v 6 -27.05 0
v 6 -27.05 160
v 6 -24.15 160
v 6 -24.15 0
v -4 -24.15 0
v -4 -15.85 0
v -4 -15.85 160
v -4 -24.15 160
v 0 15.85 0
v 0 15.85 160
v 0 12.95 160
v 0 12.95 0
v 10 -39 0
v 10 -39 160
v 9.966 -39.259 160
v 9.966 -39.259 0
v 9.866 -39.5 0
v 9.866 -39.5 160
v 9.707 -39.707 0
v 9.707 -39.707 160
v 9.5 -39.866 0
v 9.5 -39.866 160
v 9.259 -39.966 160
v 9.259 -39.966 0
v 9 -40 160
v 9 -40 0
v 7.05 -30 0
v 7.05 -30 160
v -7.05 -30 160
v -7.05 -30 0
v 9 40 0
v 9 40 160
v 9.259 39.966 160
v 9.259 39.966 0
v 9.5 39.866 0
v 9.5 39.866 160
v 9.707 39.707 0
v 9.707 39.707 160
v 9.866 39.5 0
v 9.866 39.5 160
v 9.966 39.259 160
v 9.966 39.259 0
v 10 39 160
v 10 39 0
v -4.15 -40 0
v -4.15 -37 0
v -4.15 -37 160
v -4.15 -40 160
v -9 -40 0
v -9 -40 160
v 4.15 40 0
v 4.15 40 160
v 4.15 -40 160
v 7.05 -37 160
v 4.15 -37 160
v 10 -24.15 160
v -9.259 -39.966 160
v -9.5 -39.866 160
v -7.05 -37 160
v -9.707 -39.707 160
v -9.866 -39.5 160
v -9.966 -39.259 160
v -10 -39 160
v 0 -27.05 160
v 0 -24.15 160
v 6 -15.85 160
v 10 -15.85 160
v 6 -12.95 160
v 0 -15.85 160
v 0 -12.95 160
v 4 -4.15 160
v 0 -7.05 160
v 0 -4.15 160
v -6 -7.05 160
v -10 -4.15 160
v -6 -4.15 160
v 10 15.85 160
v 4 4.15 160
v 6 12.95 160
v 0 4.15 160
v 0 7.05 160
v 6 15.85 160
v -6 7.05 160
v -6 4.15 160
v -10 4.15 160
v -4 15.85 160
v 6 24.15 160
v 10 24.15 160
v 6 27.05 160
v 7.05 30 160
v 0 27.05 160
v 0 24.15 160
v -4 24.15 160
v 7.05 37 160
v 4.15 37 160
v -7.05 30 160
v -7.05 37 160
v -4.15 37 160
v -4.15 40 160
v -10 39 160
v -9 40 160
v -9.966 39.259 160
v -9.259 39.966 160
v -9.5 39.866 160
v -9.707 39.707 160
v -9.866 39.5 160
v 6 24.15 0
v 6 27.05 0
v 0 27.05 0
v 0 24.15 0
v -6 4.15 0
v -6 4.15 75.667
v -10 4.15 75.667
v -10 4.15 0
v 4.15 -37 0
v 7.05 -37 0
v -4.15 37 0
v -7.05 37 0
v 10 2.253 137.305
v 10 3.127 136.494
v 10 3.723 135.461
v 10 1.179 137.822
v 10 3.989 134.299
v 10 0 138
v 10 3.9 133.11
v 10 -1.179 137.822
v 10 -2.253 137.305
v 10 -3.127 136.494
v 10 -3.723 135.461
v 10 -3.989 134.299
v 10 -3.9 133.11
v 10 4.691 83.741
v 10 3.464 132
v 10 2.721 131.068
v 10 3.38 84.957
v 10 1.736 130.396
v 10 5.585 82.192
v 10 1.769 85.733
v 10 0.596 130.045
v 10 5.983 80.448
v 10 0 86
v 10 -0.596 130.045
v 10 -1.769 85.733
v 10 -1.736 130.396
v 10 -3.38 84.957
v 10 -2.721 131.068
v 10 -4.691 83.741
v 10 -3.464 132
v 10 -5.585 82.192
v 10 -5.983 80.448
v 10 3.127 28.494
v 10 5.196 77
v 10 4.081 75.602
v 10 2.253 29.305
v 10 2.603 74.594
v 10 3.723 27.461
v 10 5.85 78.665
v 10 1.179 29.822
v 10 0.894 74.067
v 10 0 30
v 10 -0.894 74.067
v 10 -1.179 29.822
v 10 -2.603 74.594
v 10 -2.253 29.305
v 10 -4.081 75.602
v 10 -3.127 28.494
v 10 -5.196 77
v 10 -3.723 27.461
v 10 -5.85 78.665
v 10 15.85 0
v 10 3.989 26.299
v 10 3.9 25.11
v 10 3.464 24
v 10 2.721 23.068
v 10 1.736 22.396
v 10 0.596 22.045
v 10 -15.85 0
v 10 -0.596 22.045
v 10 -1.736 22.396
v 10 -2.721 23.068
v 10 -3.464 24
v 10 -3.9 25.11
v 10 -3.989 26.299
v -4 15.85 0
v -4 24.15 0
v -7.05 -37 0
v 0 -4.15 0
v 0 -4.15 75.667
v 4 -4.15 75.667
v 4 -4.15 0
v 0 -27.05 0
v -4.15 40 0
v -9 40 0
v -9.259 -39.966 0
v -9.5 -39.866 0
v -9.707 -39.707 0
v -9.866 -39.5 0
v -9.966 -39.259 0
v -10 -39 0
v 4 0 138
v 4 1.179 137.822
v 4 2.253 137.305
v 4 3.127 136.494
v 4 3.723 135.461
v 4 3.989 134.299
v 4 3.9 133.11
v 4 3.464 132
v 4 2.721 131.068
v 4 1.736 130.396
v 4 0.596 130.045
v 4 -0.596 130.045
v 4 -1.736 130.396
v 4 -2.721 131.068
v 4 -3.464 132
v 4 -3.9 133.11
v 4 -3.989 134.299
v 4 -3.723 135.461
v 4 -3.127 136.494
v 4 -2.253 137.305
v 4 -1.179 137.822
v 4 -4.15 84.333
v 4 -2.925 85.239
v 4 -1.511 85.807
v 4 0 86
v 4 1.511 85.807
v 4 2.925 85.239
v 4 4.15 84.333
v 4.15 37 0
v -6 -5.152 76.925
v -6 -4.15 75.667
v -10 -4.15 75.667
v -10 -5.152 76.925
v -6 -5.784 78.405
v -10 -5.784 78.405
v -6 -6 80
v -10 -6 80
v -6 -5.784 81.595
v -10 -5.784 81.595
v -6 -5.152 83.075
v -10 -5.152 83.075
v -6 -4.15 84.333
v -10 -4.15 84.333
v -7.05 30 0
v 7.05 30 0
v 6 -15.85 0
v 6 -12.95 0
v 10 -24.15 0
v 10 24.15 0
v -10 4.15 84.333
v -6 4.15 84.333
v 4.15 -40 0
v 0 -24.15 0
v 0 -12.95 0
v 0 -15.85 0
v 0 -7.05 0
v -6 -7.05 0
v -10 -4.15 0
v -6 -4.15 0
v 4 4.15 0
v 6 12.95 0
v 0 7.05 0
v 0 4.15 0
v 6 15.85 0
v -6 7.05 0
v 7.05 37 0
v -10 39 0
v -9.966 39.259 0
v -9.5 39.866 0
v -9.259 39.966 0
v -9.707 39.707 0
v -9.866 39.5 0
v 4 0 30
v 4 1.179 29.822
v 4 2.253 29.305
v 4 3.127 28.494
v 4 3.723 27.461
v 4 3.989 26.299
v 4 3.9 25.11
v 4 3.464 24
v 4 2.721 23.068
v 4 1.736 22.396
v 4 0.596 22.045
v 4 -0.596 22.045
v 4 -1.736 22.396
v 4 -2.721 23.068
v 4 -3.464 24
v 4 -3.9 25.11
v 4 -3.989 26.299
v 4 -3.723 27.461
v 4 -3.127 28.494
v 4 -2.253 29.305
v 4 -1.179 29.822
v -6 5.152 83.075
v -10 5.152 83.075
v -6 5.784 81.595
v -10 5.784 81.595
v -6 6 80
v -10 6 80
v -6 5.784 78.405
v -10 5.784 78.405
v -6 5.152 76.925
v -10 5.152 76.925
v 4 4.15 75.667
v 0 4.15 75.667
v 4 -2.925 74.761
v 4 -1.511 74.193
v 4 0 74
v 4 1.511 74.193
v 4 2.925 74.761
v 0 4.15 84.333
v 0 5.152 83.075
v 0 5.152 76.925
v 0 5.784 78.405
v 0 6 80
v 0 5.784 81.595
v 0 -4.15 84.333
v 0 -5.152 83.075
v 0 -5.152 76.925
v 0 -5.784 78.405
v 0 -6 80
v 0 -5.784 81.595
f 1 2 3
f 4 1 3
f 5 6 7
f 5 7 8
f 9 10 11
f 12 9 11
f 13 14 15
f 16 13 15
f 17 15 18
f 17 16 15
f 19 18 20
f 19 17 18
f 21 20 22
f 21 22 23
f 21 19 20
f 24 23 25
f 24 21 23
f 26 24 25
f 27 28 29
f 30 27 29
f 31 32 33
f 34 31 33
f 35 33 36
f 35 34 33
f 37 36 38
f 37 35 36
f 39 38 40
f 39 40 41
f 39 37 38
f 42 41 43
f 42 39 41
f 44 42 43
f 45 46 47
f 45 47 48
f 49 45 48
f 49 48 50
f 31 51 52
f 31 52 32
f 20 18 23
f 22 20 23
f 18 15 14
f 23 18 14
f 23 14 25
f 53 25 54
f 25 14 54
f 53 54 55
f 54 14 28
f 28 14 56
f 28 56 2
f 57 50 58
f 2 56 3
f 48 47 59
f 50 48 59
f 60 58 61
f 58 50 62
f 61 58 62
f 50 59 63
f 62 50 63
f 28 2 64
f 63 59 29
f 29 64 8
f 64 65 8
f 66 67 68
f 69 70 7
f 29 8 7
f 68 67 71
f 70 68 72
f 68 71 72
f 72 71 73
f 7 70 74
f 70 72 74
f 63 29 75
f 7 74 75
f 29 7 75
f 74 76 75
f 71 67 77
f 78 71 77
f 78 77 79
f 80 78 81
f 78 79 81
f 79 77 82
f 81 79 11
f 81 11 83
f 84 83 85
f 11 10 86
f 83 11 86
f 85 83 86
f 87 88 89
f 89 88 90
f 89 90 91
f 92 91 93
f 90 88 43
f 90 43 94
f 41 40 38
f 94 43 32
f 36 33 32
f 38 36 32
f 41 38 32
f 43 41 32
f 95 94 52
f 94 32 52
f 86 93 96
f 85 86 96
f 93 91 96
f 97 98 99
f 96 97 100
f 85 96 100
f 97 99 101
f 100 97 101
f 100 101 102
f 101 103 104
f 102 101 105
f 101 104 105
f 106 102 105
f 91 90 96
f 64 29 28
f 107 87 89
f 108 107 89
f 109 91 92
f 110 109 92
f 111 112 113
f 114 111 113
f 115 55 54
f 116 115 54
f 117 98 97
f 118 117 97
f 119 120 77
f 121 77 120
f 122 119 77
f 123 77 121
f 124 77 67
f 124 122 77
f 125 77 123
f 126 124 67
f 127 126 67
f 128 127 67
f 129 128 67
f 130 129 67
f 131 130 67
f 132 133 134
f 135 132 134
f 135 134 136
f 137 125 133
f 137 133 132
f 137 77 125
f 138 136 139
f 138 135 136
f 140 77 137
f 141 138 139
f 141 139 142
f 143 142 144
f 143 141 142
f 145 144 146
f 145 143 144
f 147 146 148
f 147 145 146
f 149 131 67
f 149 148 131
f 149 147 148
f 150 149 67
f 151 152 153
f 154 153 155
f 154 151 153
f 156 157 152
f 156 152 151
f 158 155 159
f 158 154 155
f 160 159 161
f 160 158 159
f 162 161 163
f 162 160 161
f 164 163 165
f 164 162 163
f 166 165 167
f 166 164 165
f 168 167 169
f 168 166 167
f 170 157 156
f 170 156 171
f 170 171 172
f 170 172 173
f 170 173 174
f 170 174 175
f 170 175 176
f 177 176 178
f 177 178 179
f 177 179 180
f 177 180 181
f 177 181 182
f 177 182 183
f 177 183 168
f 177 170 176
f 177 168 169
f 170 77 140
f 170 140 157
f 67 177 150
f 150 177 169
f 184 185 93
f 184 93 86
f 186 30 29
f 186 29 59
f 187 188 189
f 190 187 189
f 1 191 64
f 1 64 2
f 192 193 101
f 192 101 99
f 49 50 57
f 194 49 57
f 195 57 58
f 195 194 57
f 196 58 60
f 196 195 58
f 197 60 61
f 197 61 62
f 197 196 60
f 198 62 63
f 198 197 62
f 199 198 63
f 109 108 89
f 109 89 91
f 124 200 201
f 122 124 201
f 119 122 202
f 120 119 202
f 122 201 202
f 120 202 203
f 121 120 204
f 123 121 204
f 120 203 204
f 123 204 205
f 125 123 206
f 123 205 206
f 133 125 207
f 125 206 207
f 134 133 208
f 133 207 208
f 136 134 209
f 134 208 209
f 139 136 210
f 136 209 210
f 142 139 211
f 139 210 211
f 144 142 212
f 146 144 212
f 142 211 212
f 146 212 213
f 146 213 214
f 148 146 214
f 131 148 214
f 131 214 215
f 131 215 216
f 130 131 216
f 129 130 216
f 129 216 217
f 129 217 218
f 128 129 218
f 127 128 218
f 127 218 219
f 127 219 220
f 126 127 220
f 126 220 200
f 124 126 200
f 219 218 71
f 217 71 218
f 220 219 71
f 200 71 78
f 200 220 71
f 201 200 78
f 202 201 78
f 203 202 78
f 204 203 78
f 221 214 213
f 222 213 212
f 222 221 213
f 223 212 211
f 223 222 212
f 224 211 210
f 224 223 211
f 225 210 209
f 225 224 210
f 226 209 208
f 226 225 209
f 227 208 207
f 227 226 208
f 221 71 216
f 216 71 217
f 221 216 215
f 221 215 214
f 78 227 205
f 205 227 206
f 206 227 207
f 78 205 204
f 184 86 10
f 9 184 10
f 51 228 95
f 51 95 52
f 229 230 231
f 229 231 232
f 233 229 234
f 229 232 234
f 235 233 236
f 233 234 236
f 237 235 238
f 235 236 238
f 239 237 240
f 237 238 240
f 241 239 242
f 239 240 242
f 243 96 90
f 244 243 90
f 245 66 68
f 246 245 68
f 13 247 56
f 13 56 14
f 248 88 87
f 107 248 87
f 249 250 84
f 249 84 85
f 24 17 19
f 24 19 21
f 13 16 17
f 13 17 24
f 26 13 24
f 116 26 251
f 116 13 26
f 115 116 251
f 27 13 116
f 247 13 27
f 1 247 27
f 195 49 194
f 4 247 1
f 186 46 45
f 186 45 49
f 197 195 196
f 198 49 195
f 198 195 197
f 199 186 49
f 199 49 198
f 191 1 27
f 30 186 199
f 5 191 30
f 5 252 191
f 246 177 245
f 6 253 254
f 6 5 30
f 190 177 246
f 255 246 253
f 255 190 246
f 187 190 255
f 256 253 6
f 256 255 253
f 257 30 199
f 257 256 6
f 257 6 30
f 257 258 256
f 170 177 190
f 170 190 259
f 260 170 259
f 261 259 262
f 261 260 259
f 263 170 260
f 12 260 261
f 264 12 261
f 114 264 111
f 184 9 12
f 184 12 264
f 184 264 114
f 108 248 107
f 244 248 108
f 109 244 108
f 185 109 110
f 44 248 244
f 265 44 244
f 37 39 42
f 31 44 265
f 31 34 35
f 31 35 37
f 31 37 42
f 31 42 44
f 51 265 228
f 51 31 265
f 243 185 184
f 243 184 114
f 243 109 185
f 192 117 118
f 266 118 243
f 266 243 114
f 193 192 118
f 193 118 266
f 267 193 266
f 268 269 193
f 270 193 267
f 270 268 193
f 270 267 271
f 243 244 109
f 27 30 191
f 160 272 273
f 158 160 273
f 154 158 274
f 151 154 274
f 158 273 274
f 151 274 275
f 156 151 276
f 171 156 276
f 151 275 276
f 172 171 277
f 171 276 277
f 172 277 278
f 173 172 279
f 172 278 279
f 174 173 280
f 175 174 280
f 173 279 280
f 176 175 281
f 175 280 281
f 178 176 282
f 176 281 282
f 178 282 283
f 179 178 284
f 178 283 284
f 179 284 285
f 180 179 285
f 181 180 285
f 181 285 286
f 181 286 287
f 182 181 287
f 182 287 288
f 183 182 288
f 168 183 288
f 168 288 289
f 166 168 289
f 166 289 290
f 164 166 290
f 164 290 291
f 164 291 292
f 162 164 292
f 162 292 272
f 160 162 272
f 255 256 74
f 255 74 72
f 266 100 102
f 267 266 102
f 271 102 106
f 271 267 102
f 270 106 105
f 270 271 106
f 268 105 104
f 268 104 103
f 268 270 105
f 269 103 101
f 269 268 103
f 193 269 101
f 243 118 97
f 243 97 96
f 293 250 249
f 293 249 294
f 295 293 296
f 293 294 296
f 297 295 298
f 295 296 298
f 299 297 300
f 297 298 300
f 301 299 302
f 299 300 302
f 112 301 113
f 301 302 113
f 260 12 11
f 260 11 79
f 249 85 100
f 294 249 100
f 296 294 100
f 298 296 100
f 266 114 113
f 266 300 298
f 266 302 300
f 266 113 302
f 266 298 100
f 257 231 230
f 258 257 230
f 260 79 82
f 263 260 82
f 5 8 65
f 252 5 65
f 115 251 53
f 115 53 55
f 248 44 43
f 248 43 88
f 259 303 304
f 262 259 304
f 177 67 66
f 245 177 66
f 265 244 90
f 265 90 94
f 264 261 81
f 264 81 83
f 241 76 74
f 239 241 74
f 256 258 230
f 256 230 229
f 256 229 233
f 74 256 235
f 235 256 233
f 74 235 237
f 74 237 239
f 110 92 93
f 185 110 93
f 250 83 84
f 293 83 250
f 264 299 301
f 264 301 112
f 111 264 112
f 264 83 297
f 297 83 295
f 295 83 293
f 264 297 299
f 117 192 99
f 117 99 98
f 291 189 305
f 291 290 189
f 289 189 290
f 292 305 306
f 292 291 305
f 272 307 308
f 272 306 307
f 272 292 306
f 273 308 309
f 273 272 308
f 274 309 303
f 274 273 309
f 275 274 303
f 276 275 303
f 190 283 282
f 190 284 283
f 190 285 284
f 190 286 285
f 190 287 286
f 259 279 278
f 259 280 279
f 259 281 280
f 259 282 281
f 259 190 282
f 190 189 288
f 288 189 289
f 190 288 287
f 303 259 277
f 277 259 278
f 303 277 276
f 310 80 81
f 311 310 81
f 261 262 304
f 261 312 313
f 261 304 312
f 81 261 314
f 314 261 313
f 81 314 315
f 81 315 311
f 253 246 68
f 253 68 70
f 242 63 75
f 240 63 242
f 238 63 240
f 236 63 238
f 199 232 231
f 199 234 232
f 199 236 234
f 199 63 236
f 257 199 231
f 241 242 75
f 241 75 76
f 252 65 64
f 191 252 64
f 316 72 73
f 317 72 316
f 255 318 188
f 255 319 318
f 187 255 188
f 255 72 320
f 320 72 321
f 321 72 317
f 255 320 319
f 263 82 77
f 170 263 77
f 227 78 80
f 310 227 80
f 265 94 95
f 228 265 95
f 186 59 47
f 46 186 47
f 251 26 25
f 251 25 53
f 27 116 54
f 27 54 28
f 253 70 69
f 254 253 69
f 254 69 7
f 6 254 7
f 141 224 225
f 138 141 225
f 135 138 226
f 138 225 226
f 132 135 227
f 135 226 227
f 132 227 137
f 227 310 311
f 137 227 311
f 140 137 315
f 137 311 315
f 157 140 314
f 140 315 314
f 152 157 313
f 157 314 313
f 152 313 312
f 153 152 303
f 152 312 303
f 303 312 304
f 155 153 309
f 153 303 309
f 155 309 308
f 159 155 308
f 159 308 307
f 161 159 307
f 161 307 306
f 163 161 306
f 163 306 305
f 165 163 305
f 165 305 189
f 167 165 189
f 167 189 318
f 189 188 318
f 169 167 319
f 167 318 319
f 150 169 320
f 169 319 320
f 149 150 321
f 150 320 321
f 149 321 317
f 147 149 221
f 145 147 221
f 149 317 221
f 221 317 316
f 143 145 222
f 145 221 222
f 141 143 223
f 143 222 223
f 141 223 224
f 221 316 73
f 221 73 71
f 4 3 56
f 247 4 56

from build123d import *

# Parameters (mm, degrees)
EXTRUDE_1_DEPTH           = 160
HOLE_WIZARD_8_0_8_1_D     = 8
HOLE_WIZARD_8_0_8_2_D     = 8
HOLE_WIZARD_8_0_8_2_DEPTH = 8
HOLE_WIZARD_8_0_8_2_TIP   = 2.403442476
HOLE_WIZARD_12_0_12_2_D   = 12


with BuildPart() as part:
    # Sketch1 → 凸台-拉伸1 (new body)
    with BuildSketch(Plane.XY):
        with BuildLine():
            Line((-9, 40), (-4.15, 40))
            Line((-4.15, 40), (-4.15, 37))
            Line((-4.15, 37), (-7.05, 37))
            Line((-7.05, 37), (-7.05, 30))
            Line((-7.05, 30), (7.05, 30))
            Line((7.05, 30), (7.05, 37))
            Line((7.05, 37), (4.15, 37))
            Line((4.15, 37), (4.15, 40))
            Line((4.15, 40), (9, 40))
            ThreePointArc((9, 40), (9.707106781, 39.707106781), (10, 39))
            Line((10, 39), (10, 24.15))
            Line((10, 24.15), (6, 24.15))
            Line((6, 24.15), (6, 27.05))
            Line((6, 27.05), (0, 27.05))
            Line((0, 27.05), (0, 24.15))
            Line((0, 24.15), (-4, 24.15))
            Line((-4, 24.15), (-4, 15.85))
            Line((-4, 15.85), (0, 15.85))
            Line((0, 15.85), (0, 12.95))
            Line((0, 12.95), (6, 12.95))
            Line((6, 12.95), (6, 15.85))
            Line((6, 15.85), (10, 15.85))
            Line((10, 15.85), (10, -15.85))
            Line((10, -15.85), (6, -15.85))
            Line((6, -15.85), (6, -12.95))
            Line((6, -12.95), (0, -12.95))
            Line((0, -12.95), (0, -15.85))
            Line((0, -15.85), (-4, -15.85))
            Line((-4, -15.85), (-4, -24.15))
            Line((-4, -24.15), (0, -24.15))
            Line((0, -24.15), (0, -27.05))
            Line((0, -27.05), (6, -27.05))
            Line((6, -27.05), (6, -24.15))
            Line((6, -24.15), (10, -24.15))
            Line((10, -24.15), (10, -39))
            ThreePointArc((10, -39), (9.707106781, -39.707106781), (9, -40))
            Line((9, -40), (4.15, -40))
            Line((4.15, -40), (4.15, -37))
            Line((4.15, -37), (7.05, -37))
            Line((7.05, -37), (7.05, -30))
            Line((7.05, -30), (-7.05, -30))
            Line((-7.05, -30), (-7.05, -37))
            Line((-7.05, -37), (-4.15, -37))
            Line((-4.15, -37), (-4.15, -40))
            Line((-4.15, -40), (-9, -40))
            ThreePointArc((-9, -40), (-9.707106781, -39.707106781), (-10, -39))
            Line((-10, -39), (-10, -4.15))
            Line((-10, -4.15), (-6, -4.15))
            Line((-6, -4.15), (-6, -7.05))
            Line((-6, -7.05), (0, -7.05))
            Line((0, -7.05), (0, -4.15))
            Line((0, -4.15), (4, -4.15))
            Line((4, -4.15), (4, 4.15))
            Line((4, 4.15), (0, 4.15))
            Line((0, 4.15), (0, 7.05))
            Line((0, 7.05), (-6, 7.05))
            Line((-6, 7.05), (-6, 4.15))
            Line((-6, 4.15), (-10, 4.15))
            Line((-10, 4.15), (-10, 39))
            ThreePointArc((-10, 39), (-9.707106781, 39.707106781), (-9, 40))
        make_face()
    extrude(amount=EXTRUDE_1_DEPTH)

    # Ø8.0 (8) 直径孔1 (through all)
    with Locations(Plane(origin=(10, 0, 0), x_dir=(0, 0, -1), z_dir=(1, 0, 0))):
        with Locations((-134, 0)):
            Hole(HOLE_WIZARD_8_0_8_1_D / 2)

    # Ø8.0 (8) 直径孔2
    with Locations(Plane(origin=(10, 0, 0), x_dir=(0, 0, -1), z_dir=(1, 0, 0))):
        with Locations((-26, 0)):
            Hole(HOLE_WIZARD_8_0_8_2_D / 2, depth=HOLE_WIZARD_8_0_8_2_DEPTH)
            with Locations((0, 0, -(HOLE_WIZARD_8_0_8_2_DEPTH + HOLE_WIZARD_8_0_8_2_TIP / 2))):  # 118° drill point
                Cone(0, HOLE_WIZARD_8_0_8_2_D / 2, HOLE_WIZARD_8_0_8_2_TIP, mode=Mode.SUBTRACT)

    # Ø12.0 (12) 直径孔2 (through all)
    with Locations(Plane(origin=(10, 0, 0), x_dir=(0, 0, -1), z_dir=(1, 0, 0))):
        with Locations((-80, 0)):
            Hole(HOLE_WIZARD_12_0_12_2_D / 2)


solid = part.part
